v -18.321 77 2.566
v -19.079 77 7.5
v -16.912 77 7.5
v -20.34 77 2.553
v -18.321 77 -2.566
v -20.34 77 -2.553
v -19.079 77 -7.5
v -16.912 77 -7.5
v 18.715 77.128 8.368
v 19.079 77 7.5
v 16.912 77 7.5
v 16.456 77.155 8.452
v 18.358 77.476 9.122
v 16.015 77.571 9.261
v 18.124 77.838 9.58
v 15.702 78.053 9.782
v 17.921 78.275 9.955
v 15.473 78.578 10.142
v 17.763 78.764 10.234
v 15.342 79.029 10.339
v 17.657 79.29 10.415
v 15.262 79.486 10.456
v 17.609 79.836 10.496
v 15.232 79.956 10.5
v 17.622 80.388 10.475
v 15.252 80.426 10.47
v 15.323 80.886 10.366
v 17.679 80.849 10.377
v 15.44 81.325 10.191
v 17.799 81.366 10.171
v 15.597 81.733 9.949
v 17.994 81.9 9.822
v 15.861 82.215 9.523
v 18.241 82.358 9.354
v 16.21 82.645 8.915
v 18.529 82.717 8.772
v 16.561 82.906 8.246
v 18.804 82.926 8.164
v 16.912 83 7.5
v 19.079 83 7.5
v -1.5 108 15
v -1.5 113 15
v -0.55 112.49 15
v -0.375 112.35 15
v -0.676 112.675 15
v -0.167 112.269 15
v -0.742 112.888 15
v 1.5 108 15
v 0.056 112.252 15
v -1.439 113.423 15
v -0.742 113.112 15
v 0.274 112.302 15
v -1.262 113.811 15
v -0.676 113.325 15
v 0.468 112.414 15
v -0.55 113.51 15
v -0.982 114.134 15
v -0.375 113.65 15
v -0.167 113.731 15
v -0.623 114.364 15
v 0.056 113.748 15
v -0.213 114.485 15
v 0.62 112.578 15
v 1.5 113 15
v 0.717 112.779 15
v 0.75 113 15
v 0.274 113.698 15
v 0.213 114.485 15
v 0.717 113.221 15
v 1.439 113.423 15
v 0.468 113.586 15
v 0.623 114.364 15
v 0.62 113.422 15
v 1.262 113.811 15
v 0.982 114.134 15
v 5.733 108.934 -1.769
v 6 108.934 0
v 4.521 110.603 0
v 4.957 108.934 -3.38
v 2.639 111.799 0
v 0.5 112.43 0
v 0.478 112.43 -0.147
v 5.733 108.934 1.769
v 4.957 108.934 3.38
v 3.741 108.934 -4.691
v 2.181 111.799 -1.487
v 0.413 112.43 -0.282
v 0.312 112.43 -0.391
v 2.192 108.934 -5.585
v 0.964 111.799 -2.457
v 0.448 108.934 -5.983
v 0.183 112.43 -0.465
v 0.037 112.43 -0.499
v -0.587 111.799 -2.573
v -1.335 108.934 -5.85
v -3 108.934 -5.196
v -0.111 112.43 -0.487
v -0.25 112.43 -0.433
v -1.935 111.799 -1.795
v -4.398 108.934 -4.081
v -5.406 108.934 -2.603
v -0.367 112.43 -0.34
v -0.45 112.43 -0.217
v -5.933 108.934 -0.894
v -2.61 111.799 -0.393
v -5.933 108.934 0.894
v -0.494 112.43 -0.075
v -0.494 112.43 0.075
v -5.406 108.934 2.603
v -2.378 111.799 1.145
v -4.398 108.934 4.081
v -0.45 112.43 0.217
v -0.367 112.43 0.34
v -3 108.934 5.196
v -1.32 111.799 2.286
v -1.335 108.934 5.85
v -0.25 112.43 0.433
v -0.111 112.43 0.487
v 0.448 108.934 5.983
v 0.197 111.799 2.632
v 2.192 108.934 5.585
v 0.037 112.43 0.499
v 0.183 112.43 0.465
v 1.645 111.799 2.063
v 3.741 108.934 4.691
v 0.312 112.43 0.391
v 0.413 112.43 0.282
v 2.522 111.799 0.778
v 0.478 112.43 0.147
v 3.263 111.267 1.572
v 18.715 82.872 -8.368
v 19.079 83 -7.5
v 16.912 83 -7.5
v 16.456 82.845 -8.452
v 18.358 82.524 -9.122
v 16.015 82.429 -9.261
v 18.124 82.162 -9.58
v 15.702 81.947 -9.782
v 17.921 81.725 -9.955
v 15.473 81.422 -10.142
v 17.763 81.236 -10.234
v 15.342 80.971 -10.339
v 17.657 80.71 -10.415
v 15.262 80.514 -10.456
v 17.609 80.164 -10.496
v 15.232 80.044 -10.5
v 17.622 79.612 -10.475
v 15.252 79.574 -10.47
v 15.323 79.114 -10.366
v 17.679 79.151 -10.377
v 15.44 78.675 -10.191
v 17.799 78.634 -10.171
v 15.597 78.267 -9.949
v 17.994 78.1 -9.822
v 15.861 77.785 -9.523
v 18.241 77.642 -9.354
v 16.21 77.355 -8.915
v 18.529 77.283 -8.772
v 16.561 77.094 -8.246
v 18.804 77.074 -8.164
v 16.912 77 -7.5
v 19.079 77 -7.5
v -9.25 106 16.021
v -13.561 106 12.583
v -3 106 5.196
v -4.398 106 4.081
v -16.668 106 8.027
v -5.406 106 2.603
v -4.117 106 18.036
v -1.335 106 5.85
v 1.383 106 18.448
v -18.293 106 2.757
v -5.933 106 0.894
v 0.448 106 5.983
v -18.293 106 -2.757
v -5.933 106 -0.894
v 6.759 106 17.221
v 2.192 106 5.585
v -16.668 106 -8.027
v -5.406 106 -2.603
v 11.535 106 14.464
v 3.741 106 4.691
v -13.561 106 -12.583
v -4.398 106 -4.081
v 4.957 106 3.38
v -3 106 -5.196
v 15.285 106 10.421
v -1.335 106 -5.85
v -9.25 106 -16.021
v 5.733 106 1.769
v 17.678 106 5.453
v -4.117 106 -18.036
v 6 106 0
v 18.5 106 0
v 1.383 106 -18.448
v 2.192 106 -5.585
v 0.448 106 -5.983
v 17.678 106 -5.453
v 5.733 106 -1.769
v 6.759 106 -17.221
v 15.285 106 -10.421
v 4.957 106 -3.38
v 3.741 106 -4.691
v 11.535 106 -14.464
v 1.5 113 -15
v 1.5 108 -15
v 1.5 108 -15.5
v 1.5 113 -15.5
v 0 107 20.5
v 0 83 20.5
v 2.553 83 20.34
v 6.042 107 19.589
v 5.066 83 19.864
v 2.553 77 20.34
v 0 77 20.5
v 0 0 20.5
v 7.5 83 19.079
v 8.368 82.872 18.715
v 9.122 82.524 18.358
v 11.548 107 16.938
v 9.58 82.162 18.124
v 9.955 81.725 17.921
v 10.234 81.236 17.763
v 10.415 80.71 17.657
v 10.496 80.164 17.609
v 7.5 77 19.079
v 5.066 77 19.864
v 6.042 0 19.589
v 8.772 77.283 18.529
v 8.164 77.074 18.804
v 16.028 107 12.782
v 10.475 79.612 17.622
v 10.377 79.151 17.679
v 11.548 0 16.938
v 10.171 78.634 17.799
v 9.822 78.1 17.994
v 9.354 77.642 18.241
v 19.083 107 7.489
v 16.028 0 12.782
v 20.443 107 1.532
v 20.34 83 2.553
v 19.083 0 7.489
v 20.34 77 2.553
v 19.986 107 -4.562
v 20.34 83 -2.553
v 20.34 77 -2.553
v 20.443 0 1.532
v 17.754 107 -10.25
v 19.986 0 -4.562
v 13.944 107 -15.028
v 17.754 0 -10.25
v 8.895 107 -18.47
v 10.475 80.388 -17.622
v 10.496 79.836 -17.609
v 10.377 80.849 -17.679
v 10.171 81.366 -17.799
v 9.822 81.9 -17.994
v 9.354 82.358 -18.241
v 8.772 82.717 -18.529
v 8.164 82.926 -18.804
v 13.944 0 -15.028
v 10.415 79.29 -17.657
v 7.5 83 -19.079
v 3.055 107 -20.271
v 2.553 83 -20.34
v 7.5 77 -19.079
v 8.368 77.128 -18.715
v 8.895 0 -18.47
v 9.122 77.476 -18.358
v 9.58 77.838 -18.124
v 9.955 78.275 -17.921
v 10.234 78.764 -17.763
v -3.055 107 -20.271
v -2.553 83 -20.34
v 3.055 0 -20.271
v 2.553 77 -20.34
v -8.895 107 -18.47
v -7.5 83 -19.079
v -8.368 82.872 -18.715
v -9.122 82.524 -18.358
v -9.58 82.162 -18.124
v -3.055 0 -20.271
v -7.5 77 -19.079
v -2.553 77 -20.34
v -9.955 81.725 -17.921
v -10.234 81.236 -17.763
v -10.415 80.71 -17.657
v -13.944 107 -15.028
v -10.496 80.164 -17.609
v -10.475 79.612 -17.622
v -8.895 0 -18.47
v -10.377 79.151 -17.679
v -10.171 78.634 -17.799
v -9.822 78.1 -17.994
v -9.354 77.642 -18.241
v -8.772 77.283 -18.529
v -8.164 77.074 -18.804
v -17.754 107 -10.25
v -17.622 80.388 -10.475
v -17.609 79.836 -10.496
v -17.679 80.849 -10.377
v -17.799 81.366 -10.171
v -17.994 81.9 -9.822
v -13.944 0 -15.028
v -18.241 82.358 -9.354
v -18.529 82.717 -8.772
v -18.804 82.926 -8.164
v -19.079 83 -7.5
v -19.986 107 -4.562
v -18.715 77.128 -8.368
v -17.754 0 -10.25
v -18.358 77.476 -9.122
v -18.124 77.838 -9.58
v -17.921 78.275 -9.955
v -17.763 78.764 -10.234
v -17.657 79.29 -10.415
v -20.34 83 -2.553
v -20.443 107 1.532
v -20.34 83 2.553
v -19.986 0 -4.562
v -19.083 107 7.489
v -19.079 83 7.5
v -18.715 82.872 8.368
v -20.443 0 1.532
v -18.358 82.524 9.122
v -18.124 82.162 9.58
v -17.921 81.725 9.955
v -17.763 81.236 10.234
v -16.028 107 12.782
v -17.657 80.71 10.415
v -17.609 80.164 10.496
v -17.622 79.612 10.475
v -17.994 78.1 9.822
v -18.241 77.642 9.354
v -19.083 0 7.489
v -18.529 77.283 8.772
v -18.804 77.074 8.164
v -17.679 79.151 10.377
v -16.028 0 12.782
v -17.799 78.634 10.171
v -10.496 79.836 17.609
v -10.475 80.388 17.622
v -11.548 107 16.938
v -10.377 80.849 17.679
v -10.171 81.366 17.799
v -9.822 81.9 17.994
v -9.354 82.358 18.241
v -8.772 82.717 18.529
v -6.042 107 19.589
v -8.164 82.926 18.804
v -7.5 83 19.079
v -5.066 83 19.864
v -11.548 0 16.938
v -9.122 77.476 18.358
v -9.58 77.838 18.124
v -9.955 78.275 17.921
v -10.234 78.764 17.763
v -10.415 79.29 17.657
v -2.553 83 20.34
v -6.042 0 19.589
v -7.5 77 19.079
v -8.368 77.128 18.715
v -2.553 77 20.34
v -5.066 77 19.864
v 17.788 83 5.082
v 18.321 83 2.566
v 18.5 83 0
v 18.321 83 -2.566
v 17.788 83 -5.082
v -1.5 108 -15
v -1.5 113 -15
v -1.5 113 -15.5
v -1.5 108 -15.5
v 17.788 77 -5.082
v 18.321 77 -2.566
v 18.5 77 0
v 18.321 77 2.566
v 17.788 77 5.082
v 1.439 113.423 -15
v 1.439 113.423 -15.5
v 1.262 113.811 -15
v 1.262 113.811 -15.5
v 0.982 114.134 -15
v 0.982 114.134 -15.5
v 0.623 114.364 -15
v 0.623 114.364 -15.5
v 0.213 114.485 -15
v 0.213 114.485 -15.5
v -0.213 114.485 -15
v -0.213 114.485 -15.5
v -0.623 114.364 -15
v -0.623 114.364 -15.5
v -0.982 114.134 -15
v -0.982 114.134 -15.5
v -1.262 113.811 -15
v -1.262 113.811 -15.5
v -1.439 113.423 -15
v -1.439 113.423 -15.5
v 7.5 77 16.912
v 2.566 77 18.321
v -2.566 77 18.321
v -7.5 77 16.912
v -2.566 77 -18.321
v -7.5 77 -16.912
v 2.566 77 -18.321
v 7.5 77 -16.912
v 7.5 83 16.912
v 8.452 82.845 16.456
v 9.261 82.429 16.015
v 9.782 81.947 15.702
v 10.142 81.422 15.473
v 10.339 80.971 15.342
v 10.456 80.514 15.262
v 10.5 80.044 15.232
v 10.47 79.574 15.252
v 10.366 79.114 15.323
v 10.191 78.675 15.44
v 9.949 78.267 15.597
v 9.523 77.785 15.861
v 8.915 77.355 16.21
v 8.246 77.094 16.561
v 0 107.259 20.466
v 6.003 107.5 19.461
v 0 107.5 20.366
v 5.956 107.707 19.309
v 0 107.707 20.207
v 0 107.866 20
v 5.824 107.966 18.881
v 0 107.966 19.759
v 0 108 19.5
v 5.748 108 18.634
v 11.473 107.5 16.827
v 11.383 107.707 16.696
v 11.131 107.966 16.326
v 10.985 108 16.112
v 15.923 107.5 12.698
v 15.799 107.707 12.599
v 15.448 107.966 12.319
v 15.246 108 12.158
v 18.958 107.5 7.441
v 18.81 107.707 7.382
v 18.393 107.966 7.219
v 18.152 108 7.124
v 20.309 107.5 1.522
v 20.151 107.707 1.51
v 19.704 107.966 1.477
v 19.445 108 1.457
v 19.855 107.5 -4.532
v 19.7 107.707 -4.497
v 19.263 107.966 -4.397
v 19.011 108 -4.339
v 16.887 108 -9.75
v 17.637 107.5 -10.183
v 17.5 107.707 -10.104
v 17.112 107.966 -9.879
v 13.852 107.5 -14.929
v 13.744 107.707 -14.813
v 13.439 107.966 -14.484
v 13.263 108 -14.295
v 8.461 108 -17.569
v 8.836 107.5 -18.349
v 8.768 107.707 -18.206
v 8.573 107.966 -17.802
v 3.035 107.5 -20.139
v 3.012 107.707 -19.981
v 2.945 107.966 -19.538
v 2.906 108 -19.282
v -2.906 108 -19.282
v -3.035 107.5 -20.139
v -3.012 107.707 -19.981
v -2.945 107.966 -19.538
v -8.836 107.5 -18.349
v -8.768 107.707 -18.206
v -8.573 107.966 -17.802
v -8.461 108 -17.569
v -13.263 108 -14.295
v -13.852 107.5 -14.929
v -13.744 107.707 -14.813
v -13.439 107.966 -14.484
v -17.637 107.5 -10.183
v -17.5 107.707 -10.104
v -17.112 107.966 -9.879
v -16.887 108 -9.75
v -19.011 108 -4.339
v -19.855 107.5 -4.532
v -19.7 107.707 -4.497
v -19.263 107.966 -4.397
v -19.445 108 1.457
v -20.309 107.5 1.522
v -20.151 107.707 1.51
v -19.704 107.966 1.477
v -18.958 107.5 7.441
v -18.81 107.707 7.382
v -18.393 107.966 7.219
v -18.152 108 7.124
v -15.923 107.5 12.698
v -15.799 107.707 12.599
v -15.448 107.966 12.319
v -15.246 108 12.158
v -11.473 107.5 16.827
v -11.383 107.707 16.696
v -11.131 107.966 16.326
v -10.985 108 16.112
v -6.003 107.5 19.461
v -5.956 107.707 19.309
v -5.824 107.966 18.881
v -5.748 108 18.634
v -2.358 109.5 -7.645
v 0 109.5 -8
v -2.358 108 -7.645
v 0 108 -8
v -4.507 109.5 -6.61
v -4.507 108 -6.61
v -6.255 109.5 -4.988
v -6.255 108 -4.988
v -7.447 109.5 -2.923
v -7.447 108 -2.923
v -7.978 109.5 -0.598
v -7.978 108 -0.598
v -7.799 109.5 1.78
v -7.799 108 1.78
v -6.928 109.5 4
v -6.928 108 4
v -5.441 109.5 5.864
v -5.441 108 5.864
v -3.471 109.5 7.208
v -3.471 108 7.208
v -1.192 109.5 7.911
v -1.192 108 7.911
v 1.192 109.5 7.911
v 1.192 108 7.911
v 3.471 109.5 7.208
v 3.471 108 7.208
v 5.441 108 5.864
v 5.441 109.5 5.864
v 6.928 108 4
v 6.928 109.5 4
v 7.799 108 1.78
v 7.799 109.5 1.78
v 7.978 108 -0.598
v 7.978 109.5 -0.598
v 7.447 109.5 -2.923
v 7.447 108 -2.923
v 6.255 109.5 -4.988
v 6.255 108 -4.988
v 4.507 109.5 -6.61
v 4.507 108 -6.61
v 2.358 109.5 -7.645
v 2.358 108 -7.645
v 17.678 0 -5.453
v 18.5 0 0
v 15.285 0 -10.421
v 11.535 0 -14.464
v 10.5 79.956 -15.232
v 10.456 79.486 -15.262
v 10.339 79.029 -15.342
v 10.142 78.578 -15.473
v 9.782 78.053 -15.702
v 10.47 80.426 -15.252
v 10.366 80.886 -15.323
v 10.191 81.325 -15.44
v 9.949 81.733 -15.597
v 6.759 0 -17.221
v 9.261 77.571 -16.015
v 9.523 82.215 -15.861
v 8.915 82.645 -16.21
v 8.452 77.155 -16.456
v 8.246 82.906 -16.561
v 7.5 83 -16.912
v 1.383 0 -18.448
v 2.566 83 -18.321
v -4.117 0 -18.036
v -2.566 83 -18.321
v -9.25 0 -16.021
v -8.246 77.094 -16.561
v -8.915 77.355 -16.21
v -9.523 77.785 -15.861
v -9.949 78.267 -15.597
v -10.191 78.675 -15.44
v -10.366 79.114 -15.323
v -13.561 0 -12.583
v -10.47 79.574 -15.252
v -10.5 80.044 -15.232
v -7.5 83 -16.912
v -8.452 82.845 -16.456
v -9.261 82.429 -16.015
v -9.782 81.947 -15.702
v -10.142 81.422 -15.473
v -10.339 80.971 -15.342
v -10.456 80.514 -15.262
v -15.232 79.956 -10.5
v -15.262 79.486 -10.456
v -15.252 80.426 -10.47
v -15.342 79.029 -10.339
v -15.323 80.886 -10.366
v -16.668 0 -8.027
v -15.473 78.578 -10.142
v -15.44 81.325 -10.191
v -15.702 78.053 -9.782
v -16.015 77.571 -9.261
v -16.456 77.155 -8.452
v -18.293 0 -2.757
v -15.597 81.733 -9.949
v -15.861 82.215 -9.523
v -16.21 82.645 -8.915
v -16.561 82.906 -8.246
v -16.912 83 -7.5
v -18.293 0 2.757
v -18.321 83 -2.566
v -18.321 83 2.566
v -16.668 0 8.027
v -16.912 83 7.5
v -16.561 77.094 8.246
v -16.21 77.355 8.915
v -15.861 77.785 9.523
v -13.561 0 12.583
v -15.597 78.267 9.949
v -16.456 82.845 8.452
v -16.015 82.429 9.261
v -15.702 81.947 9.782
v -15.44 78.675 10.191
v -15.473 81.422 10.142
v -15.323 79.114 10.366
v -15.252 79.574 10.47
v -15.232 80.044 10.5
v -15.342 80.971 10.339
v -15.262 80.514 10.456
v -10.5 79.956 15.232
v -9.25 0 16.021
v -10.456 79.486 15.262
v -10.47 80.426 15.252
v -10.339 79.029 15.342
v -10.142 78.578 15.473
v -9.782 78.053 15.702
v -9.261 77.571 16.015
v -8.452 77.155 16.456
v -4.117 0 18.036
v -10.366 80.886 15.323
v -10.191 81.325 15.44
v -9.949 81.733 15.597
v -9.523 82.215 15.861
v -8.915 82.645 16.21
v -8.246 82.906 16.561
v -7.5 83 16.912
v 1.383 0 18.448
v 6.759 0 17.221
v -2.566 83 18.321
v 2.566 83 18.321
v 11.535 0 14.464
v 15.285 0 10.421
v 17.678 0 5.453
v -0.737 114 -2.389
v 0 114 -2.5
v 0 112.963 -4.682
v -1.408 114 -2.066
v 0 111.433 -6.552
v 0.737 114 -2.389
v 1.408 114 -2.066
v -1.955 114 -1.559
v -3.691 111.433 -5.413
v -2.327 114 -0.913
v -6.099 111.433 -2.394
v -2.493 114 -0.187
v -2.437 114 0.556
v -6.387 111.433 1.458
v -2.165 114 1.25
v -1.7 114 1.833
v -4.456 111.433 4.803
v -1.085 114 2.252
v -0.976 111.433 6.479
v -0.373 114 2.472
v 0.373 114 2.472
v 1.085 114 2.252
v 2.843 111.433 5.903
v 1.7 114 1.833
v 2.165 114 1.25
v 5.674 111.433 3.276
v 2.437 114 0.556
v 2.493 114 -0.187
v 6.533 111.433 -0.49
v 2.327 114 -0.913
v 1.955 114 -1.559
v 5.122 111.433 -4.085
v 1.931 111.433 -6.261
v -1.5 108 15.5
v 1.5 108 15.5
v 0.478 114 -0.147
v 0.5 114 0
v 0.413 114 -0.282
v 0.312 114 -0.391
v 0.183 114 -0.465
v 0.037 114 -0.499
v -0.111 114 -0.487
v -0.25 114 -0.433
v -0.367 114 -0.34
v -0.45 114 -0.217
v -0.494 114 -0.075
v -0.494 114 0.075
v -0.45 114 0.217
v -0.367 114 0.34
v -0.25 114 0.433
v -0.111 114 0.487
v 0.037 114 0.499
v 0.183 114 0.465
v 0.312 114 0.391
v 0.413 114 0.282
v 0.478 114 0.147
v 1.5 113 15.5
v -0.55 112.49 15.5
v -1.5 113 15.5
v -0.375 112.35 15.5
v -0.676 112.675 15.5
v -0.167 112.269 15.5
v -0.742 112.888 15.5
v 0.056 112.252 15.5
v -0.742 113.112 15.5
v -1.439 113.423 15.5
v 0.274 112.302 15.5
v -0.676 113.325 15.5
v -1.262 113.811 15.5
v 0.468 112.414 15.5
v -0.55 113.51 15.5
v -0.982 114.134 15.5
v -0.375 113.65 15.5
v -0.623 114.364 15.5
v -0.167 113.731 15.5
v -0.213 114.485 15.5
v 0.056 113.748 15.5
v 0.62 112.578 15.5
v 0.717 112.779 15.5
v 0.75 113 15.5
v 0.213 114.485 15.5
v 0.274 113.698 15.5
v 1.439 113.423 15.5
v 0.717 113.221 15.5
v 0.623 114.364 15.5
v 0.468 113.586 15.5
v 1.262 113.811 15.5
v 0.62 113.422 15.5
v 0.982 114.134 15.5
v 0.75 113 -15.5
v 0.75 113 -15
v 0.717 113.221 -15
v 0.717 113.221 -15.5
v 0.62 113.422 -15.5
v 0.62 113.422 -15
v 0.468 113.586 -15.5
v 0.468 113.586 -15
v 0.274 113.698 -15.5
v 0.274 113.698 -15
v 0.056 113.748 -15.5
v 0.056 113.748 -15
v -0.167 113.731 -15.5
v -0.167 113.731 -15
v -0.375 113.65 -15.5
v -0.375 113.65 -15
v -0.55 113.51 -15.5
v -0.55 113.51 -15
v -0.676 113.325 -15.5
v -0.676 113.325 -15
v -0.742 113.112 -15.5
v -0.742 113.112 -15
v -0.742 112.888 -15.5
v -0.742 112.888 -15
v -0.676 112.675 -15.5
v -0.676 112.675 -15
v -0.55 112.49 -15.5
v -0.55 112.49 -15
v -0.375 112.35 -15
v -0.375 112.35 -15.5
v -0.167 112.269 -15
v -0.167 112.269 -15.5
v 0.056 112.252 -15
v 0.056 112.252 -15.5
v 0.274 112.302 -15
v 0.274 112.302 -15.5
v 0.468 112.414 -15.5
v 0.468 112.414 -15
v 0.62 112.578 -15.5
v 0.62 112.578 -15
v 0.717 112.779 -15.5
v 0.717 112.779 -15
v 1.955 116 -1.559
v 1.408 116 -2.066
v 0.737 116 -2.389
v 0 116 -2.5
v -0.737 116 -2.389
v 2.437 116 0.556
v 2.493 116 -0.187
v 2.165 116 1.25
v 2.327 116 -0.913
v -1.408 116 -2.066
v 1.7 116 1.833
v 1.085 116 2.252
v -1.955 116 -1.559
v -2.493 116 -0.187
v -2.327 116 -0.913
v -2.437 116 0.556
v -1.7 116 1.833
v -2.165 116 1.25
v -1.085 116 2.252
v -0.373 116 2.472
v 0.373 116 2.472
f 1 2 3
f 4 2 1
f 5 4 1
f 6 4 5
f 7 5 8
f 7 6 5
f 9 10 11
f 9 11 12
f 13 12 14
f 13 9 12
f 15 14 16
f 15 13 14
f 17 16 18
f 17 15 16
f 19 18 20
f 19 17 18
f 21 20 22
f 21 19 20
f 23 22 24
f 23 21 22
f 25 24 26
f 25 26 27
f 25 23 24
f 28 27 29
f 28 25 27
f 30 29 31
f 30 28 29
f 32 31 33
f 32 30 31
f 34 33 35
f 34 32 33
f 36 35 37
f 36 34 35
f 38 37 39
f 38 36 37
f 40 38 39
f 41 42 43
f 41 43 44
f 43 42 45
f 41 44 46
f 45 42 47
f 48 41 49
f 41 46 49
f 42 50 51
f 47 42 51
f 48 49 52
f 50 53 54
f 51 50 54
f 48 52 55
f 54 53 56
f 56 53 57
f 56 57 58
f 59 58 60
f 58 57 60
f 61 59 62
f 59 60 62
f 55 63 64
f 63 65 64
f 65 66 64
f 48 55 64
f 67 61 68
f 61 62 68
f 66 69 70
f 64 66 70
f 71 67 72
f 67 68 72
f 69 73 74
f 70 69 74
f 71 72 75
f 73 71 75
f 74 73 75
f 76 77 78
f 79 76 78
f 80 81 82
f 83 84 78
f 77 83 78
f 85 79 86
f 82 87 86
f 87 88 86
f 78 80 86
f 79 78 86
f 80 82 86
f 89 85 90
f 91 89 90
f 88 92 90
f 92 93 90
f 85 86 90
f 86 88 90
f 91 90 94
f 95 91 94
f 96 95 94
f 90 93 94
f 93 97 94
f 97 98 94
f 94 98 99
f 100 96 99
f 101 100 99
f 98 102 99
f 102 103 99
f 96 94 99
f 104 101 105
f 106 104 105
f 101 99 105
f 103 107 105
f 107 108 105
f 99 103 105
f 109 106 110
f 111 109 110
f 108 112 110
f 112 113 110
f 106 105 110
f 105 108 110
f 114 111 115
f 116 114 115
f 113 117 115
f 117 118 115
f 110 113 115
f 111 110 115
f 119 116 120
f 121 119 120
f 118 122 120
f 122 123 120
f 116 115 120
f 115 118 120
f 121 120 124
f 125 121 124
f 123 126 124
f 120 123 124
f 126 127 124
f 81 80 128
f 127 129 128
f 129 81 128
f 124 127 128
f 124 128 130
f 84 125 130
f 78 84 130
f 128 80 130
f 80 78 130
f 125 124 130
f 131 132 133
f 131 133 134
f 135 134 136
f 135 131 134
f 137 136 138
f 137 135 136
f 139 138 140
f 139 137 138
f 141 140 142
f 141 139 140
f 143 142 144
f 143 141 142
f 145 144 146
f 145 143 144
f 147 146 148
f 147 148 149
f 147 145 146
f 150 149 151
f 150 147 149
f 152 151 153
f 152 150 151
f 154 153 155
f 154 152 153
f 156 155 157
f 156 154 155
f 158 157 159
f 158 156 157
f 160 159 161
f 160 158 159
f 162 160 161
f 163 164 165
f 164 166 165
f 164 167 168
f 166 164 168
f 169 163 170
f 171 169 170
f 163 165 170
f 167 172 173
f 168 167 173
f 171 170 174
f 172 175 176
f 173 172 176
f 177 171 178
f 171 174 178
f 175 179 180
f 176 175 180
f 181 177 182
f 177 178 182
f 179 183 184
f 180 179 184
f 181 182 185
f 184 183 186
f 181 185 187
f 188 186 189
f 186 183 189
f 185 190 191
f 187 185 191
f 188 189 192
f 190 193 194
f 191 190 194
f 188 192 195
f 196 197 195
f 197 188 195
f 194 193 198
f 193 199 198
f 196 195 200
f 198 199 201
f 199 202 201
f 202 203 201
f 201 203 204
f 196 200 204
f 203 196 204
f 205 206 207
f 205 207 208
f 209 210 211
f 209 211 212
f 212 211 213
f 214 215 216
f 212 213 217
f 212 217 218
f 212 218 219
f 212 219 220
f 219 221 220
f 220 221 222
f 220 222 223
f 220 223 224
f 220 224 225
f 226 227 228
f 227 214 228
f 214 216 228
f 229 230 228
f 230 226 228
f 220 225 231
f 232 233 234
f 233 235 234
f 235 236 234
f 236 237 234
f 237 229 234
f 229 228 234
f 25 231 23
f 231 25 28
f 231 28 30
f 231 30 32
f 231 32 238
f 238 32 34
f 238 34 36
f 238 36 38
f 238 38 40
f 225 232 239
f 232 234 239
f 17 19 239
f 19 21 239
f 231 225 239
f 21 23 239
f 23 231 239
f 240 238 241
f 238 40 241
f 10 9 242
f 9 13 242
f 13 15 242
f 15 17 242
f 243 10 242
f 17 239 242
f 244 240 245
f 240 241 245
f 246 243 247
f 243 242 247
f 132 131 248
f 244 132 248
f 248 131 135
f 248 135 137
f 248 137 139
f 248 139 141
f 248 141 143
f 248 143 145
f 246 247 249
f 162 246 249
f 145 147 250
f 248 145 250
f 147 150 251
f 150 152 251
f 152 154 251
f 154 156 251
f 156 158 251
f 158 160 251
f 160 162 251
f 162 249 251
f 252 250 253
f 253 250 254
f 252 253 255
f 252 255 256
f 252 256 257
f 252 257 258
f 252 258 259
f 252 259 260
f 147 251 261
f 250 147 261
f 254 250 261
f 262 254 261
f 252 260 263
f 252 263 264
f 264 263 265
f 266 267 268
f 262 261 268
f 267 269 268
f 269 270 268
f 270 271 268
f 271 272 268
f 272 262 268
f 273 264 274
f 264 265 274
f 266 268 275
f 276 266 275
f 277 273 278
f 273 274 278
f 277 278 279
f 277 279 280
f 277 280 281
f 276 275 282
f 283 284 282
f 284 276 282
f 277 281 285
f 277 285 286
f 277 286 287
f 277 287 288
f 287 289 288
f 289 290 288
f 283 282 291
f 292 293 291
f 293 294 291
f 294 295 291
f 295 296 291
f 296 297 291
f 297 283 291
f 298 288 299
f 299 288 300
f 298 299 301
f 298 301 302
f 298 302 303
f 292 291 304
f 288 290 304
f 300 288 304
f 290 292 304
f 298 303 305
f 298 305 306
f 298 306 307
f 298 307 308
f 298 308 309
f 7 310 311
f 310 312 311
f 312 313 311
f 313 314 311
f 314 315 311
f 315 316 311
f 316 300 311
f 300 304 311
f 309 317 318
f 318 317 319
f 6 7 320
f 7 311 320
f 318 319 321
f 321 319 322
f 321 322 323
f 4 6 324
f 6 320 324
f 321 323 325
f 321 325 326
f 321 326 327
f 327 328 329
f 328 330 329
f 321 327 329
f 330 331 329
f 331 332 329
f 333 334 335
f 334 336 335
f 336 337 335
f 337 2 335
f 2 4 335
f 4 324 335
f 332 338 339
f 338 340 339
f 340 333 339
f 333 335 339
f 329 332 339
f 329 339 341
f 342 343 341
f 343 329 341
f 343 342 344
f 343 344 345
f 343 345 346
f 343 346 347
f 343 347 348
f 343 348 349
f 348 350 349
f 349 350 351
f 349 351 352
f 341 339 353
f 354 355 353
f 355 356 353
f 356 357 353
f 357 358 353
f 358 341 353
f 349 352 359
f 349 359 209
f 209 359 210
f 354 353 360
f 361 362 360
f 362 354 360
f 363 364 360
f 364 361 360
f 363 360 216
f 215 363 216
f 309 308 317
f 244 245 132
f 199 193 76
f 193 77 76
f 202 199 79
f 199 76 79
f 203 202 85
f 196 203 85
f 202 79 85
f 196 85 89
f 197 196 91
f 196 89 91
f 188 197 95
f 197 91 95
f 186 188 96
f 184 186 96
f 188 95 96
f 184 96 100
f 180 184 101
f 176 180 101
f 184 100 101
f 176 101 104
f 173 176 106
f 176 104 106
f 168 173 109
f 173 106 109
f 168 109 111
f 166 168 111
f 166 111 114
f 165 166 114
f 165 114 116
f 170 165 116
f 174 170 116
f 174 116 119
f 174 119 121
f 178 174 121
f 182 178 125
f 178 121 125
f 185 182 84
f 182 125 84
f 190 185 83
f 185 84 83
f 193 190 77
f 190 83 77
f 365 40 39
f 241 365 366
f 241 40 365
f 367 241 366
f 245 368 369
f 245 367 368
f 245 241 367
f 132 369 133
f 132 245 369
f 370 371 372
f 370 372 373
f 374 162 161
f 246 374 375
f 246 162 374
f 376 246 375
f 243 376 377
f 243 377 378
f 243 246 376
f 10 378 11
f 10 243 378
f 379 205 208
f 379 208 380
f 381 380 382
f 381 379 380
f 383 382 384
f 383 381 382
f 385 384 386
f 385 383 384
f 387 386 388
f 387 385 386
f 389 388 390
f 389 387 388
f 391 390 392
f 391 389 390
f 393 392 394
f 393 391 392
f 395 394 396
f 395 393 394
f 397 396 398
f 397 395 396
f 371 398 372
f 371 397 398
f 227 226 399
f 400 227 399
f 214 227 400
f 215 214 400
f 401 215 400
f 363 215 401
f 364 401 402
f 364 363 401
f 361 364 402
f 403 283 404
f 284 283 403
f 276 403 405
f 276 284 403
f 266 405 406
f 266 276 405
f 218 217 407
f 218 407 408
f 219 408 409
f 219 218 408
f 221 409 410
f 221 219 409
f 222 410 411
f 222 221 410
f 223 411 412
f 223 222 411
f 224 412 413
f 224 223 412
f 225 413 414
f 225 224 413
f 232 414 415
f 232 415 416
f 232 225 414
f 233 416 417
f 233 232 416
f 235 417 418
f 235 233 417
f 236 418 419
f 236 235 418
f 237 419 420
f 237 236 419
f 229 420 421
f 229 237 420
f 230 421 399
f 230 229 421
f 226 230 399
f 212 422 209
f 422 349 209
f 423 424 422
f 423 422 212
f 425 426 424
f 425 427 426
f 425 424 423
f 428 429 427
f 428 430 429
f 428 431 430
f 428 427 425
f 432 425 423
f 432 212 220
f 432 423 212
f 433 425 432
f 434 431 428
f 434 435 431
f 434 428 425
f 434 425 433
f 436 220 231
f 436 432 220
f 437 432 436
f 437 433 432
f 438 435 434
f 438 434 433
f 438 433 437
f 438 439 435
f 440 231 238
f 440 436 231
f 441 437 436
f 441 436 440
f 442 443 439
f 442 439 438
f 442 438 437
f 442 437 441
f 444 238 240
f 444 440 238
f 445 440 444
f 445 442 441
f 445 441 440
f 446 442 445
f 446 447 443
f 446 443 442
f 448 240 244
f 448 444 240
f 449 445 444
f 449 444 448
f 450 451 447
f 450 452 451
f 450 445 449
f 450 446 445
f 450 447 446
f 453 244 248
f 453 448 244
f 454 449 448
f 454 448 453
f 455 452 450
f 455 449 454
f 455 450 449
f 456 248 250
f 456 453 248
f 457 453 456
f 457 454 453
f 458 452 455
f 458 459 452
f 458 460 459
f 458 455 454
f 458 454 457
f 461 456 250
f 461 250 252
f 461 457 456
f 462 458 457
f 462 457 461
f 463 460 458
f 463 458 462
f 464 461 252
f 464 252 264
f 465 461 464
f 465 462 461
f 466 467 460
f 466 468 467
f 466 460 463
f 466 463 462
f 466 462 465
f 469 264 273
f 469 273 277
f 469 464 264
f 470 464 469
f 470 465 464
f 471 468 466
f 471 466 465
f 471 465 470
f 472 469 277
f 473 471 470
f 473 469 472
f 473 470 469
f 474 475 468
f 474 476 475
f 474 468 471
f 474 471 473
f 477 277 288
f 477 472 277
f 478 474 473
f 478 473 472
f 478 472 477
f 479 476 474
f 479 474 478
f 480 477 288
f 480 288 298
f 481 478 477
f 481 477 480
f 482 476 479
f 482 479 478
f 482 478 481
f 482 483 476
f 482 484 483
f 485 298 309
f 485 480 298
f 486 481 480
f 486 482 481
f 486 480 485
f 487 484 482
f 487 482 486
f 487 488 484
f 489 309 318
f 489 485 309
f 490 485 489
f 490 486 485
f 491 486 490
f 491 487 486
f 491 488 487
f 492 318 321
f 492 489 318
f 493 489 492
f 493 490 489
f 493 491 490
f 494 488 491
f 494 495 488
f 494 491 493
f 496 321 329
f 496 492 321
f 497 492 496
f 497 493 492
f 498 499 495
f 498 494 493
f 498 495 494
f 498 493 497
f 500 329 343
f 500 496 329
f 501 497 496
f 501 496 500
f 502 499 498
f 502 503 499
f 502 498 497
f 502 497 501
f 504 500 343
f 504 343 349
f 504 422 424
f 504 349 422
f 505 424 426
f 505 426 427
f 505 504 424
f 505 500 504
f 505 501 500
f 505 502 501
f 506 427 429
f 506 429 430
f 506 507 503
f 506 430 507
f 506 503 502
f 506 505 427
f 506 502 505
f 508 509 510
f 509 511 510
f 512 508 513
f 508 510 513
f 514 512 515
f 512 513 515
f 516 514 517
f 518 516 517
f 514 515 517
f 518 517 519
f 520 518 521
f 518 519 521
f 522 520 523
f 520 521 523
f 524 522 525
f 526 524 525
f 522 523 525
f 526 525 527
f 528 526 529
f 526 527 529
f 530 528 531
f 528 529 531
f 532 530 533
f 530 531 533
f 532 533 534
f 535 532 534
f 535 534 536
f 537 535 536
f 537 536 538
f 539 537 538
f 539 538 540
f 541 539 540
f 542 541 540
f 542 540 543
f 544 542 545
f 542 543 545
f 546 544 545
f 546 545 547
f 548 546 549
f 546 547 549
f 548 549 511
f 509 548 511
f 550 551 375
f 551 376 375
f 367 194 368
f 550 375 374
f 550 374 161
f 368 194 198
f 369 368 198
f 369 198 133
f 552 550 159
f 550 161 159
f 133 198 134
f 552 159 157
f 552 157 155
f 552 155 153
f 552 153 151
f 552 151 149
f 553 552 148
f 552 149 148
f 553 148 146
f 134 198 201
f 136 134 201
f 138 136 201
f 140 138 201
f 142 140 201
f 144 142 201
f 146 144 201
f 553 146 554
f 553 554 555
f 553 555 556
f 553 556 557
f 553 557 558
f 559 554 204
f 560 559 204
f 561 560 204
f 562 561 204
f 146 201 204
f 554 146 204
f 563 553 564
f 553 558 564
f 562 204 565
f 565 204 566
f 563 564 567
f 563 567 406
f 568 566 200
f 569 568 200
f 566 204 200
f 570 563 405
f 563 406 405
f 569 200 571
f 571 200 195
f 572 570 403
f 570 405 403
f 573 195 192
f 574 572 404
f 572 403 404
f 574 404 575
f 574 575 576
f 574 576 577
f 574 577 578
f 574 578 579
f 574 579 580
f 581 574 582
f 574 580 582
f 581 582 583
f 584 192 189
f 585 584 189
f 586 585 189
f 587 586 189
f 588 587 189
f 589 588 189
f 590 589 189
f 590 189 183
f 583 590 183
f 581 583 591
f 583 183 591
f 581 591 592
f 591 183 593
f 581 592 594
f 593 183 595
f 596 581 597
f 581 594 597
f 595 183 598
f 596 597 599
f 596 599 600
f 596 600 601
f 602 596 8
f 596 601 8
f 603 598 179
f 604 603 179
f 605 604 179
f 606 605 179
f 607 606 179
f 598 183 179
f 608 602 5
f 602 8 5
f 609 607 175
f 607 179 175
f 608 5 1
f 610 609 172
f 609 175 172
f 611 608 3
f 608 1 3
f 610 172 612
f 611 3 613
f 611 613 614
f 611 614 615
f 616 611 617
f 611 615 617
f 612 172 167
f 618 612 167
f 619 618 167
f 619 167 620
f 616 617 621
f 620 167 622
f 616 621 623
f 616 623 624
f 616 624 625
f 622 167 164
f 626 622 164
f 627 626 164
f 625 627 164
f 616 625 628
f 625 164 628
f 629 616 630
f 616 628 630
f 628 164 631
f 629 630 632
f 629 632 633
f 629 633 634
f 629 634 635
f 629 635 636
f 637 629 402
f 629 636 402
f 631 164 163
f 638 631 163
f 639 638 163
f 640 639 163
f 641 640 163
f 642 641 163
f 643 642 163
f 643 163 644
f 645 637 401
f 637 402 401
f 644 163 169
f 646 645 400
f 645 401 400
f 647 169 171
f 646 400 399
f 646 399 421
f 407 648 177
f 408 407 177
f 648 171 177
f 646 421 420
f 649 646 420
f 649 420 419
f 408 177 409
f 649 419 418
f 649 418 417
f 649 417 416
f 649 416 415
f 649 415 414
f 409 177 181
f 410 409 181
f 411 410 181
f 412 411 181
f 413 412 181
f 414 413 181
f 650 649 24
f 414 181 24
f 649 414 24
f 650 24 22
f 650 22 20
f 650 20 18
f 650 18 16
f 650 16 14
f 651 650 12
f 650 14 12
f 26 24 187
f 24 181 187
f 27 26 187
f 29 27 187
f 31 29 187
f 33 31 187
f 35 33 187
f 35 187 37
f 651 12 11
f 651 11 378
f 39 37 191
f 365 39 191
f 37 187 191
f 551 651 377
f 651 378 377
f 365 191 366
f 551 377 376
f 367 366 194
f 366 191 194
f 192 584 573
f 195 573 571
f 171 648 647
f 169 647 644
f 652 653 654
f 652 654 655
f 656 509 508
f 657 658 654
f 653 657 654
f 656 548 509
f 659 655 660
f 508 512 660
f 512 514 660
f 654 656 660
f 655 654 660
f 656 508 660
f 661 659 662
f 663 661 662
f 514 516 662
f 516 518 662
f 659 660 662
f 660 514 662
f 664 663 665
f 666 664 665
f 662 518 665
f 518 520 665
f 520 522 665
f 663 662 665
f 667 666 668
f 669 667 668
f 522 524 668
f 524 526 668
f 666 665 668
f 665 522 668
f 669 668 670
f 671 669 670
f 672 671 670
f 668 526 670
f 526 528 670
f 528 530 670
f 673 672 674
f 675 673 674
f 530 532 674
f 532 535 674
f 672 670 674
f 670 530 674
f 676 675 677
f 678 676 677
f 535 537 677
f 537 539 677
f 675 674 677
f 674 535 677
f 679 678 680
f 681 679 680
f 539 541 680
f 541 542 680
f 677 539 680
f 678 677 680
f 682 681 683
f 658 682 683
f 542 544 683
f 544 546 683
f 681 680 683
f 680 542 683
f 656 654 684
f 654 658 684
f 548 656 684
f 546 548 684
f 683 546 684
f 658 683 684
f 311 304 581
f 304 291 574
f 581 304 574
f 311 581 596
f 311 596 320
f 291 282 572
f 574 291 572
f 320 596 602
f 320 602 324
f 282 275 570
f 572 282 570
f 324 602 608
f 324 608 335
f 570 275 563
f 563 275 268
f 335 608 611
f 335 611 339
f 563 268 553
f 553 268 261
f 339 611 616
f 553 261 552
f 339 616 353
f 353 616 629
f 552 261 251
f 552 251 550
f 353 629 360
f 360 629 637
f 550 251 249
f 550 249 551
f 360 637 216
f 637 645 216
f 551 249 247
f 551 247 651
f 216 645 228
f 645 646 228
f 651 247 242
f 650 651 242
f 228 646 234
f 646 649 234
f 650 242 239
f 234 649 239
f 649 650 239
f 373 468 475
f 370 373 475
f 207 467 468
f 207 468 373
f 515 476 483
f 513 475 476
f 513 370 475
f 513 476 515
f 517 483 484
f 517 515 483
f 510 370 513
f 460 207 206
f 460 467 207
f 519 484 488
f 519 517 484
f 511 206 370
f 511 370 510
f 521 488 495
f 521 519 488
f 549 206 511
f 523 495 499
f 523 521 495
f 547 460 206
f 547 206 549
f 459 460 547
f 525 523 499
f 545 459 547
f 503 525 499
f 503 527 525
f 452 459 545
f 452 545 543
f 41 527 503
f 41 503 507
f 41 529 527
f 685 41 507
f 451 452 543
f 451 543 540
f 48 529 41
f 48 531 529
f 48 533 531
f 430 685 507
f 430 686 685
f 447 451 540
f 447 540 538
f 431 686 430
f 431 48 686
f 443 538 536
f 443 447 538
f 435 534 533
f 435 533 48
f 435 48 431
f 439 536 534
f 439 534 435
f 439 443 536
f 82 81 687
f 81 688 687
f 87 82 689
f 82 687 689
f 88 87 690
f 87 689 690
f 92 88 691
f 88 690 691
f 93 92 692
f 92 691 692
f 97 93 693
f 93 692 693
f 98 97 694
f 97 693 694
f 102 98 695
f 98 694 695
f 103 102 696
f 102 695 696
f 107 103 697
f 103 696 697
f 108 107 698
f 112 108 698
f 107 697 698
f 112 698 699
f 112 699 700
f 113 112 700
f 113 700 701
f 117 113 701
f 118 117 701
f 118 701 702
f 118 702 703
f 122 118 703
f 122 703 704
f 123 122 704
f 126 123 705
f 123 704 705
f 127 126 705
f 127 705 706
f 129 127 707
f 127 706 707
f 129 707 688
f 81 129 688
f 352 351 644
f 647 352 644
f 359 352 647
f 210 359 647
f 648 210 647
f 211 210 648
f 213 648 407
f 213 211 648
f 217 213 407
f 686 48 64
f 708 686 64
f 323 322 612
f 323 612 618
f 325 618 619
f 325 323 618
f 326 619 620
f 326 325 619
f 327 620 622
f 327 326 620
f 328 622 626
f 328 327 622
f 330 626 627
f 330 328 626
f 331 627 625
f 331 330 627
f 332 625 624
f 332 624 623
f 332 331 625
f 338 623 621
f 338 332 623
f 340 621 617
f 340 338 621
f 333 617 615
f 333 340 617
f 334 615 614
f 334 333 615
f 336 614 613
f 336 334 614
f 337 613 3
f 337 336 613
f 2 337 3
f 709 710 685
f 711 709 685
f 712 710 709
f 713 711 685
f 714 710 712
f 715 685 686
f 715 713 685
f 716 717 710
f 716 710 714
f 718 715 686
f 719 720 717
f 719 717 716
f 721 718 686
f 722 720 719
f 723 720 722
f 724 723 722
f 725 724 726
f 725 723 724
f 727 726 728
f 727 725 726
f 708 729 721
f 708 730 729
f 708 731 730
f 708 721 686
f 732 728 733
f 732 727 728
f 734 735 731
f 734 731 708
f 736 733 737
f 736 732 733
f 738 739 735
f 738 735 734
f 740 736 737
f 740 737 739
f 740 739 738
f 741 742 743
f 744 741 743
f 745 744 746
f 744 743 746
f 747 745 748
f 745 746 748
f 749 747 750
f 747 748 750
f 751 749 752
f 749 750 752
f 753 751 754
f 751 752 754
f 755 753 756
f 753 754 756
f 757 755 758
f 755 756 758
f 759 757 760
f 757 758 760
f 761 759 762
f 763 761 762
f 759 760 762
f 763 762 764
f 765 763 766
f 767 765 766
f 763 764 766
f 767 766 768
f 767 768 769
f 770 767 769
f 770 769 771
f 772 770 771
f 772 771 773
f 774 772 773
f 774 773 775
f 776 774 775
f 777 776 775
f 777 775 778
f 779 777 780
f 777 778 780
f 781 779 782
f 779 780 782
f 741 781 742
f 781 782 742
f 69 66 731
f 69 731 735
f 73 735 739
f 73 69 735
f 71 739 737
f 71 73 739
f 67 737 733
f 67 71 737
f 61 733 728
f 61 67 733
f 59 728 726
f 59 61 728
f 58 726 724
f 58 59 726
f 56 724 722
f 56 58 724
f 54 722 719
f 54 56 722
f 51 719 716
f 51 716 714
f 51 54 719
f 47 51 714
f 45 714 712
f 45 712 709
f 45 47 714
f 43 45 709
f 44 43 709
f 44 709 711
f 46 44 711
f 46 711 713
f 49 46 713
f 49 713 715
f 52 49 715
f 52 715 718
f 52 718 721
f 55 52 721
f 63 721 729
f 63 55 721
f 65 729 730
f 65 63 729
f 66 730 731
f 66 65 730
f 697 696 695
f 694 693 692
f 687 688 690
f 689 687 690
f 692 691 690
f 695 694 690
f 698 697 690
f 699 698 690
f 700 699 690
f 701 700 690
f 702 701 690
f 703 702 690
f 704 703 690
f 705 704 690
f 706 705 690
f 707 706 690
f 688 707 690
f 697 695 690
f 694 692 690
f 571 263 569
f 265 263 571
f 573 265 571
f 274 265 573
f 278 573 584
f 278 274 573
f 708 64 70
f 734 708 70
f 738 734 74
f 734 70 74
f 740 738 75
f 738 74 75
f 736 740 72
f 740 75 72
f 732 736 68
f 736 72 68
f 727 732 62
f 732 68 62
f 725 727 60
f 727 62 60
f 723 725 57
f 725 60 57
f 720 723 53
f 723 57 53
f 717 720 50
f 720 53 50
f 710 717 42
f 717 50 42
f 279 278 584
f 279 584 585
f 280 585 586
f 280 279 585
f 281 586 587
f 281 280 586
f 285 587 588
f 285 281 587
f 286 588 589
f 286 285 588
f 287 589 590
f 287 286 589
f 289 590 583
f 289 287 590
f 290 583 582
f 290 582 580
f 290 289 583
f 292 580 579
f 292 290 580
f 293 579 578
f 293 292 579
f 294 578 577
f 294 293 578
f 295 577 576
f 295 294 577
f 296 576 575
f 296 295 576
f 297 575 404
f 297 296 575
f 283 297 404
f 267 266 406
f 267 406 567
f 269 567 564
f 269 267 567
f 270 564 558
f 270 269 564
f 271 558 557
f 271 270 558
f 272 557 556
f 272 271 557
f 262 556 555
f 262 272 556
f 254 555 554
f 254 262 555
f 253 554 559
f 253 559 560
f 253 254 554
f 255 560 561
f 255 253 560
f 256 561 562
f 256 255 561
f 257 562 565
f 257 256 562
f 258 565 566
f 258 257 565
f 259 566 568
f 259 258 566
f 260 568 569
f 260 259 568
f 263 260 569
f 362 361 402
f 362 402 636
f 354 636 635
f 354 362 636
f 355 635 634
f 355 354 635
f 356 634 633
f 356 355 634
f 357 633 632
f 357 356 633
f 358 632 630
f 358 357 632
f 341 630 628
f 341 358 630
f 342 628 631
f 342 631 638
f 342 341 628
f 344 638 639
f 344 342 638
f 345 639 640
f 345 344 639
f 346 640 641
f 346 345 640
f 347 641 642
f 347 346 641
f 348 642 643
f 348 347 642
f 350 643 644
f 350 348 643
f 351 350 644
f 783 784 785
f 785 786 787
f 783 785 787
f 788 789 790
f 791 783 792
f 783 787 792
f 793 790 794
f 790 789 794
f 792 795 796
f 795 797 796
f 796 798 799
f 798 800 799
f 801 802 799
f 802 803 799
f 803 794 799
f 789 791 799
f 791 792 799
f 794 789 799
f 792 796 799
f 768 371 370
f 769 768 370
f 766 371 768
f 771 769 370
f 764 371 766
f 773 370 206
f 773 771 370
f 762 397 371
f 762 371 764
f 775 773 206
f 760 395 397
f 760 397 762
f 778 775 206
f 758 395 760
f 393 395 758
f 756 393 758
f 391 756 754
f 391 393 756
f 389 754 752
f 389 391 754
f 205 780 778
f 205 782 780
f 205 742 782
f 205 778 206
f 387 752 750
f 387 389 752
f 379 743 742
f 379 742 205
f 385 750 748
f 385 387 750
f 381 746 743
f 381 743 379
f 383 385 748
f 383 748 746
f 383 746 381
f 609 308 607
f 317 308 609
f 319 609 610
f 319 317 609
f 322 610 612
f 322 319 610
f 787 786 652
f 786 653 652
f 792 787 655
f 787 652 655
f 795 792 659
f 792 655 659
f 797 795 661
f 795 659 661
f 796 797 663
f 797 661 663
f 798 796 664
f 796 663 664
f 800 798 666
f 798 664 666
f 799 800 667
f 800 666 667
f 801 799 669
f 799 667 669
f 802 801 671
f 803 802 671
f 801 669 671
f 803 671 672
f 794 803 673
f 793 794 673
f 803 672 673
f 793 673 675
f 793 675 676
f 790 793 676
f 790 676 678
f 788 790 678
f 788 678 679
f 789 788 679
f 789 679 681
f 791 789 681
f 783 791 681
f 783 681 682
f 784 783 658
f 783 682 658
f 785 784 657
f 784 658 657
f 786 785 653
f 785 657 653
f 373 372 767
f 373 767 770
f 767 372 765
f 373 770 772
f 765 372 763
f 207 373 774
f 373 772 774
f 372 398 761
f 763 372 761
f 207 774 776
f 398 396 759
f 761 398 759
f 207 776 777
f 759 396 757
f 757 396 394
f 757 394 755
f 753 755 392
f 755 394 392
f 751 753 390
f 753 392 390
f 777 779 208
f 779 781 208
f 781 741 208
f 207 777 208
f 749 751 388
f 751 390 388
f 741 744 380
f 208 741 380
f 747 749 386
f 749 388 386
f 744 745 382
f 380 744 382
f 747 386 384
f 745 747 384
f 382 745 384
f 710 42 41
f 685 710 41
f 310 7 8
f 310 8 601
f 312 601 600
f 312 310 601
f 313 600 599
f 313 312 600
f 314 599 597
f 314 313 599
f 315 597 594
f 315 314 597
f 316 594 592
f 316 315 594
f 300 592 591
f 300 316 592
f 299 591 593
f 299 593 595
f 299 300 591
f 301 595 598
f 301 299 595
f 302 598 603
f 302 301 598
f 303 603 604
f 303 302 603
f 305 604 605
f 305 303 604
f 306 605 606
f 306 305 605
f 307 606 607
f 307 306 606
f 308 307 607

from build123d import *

# Parameters (mm, degrees)
SKETCH1_R               = 20.5
BOSS_EXTRUDE1_DEPTH     = 108
FILLET1_R               = 1
CUT_EXTRUDE1_REACH      = 130.166
CUT_EXTRUDE1_END_RADIUS = 18.5
CIRPATTERN1_COUNT       = 4
SKETCH7_R               = 0.75
BOSS_EXTRUDE2_DEPTH     = 0.5


# Read off the part's stored shape, not the designer's step: Shell1
with BuildPart() as part:
    # Sketch1 → Boss-Extrude1 (new body)
    with BuildSketch(Plane(origin=(0, 0, 0), x_dir=(1, 0, 0), z_dir=(0, 1, 0))):
        with Locations(Location((0, 0, 0), (0, 0, 270))):
            Circle(SKETCH1_R)
    extrude(amount=BOSS_EXTRUDE1_DEPTH)

    # Sketch3 → Revolve1 (revolve)
    with BuildSketch(Plane(origin=(0, 0, 0), x_dir=(0, 0, -1), z_dir=(1, 0, 0))):
        with BuildLine():
            Line((0, 116), (2.5, 116))
            Line((2.5, 116), (2.5, 114))
            ThreePointArc((2.5, 114), (5.663213274, 112.255038446), (8, 109.5))
            Line((8, 109.5), (8, 108))
            Line((8, 108), (0, 108))
            Line((0, 108), (0, 116))
        make_face()
    revolve(axis=Axis((0, 108, 0), (0, 1, 0)))

    # Fillet1
    fillet1_edges = [part.edges().sort_by_distance(p)[0] for p in [
        (0, 108, -20.5),
    ]]
    fillet(fillet1_edges, radius=FILLET1_R)

    # Shell1 outline → Shell1 (revolve, cut)
    with BuildSketch(Plane.XY):
        with BuildLine():
            Line((18.5, 0), (18.5, 106))
            Line((18.5, 106), (6, 106))
            Line((6, 106), (6, 108.933863711))
            ThreePointArc((6, 108.933863711), (3.622087212, 111.267143588), (0.5, 112.429570209))
            Line((0.5, 112.429570209), (0.5, 114))
            Line((0.5, 114), (0, 114))
            Line((0, 114), (0, 0))
            Line((0, 0), (18.5, 0))
        make_face()
    revolve(axis=Axis((0, 0, 0), (0, 1, 0)), mode=Mode.SUBTRACT)

    # Cut-Extrude1: up to this cylinder (the profile starts outside it)
    cut_extrude1_end = Plane(origin=(0, 80, 0), z_dir=(0, -1, 0)) * Cylinder(CUT_EXTRUDE1_END_RADIUS, 298.332, mode=Mode.PRIVATE)
    # Sketch4 → Cut-Extrude1 (cut, up to the surface)
    with BuildSketch(Plane(origin=(30, 0, 0), x_dir=(0, 0, -1), z_dir=(1, 0, 0)), mode=Mode.PRIVATE) as cut_extrude1_sk1:
        with BuildLine():
            Line((-7.5, 83), (7.5, 83))
            ThreePointArc((7.5, 83), (10.5, 80), (7.5, 77))
            Line((7.5, 77), (-7.5, 77))
            ThreePointArc((-7.5, 77), (-10.5, 80), (-7.5, 83))
        make_face()
    cut_extrude1_tool1 = extrude(cut_extrude1_sk1.sketch, amount=-CUT_EXTRUDE1_REACH, mode=Mode.PRIVATE) - cut_extrude1_end
    cut_extrude1 = cut_extrude1_tool1.solids().sort_by_distance((30, 80, 0))[0]
    add(cut_extrude1, mode=Mode.SUBTRACT)

    # CirPattern1: Cut-Extrude1 ×4 about axis
    cirpattern1_axis = Axis((0, 0, 0), (0, 1, 0))
    for i in range(1, CIRPATTERN1_COUNT):
        add(cut_extrude1.rotate(cirpattern1_axis, i * 360 / CIRPATTERN1_COUNT), mode=Mode.SUBTRACT)

    # Sketch7 → Boss-Extrude2 (add)
    with BuildSketch(Plane.XY.offset(15)):
        with BuildLine():
            Line((-1.5, 108), (1.5, 108))
            Line((1.5, 108), (1.5, 113))
            ThreePointArc((1.5, 113), (0, 114.5), (-1.5, 113))
            Line((-1.5, 113), (-1.5, 108))
        make_face()
        with Locations((0, 113)):
            Circle(SKETCH7_R, mode=Mode.SUBTRACT)
    boss_extrude2 = extrude(amount=BOSS_EXTRUDE2_DEPTH)

    # Mirror1: Boss-Extrude2 across plane
    add(boss_extrude2.mirror(Plane.XY))


solid = part.part
